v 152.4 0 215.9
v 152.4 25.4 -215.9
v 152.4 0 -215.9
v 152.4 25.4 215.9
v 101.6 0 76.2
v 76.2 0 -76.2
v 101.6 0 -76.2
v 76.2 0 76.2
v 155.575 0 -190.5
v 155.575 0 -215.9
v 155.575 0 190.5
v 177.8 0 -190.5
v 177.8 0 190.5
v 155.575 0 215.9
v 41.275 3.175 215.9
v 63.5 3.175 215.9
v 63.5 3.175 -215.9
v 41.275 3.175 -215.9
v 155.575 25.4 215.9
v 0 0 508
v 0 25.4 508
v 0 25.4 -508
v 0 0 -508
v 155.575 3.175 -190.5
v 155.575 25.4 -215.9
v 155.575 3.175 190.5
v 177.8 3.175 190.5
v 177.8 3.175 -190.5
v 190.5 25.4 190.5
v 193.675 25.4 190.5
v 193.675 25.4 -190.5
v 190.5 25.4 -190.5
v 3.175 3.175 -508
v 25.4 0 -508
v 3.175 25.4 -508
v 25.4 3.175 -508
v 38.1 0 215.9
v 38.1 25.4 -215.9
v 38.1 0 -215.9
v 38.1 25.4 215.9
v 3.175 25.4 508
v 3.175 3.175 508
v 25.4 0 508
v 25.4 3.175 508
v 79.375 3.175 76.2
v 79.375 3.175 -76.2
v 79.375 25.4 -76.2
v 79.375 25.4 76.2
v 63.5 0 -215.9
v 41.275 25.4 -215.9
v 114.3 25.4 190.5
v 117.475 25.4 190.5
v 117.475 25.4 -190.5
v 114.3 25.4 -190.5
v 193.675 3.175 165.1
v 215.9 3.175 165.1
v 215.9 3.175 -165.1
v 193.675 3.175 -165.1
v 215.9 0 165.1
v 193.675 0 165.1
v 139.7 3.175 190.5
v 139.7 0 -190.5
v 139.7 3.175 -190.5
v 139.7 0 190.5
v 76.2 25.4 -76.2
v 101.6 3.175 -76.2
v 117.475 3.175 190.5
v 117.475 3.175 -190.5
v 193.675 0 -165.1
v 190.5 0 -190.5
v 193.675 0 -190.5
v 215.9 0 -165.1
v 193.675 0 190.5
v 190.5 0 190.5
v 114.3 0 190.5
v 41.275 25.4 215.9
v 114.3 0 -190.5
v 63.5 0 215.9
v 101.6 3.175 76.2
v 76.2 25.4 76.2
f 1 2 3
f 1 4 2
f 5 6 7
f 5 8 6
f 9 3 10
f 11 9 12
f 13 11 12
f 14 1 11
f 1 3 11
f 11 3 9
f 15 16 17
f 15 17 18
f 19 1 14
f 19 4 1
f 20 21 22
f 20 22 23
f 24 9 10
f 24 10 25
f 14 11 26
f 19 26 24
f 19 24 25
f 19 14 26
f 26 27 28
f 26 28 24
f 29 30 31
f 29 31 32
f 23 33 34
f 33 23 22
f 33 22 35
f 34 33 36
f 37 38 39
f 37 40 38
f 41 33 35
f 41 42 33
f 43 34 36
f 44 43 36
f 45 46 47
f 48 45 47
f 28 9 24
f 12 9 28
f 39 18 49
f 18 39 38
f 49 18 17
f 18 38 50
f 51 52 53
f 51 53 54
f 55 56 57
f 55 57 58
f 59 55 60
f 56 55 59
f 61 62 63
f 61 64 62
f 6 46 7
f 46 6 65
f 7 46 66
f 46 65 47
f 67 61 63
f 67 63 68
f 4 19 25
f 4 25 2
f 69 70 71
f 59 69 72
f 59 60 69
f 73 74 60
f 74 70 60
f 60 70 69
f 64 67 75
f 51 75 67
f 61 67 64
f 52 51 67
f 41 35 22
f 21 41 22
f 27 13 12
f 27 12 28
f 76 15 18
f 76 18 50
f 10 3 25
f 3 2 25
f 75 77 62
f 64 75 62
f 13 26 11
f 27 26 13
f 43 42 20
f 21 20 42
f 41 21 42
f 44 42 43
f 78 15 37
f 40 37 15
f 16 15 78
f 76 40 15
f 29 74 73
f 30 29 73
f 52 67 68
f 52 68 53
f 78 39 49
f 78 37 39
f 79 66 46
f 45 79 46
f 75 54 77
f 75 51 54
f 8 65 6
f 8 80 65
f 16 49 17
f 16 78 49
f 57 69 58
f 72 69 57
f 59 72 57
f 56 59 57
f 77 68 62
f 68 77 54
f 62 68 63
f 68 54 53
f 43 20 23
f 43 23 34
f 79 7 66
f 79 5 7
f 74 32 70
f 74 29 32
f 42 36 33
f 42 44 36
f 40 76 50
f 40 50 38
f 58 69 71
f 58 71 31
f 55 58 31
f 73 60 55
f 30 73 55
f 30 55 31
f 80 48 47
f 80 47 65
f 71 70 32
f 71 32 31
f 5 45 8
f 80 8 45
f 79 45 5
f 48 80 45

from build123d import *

# Parameters (mm, degrees)
F1_DEPTH  = 508
F2_DEPTH  = 215.9
F3_DEPTH  = 76.2
F4_DEPTH  = 190.5
F5_DEPTH  = 215.9
F6_DEPTH  = 190.5
F7_W      = 22.225
F7_H      = 3.175
F8_DEPTH  = 25.4
F9_W      = 22.225
F9_H      = 3.175
F10_DEPTH = 25.4
F11_W     = 22.225
F11_H     = 3.175
F12_DEPTH = 25.4
F13_W     = 22.225
F13_H     = 3.175
F14_DEPTH = 25.4


with BuildPart() as f1:
    # F0 (on Top) → F1 (new body, symmetric)
    with BuildSketch(Plane.XY):
        Polygon((3.175, 25.4), (0, 25.4), (0, 0), (25.4, 0), (25.4, 3.175), (3.175, 3.175), align=None)
    extrude(amount=F1_DEPTH, both=True)


with BuildPart() as f2:
    # F0 (on Top) → F2 (new body, symmetric)
    with BuildSketch(Plane.XY):
        Polygon((63.5, 0), (63.5, 3.175), (41.275, 3.175), (41.275, 25.4), (38.1, 25.4), (38.1, 0), align=None)
    extrude(amount=F2_DEPTH, both=True)


with BuildPart() as f3:
    # F0 (on Top) → F3 (new body, symmetric)
    with BuildSketch(Plane.XY):
        Polygon((101.6, 0), (101.6, 3.175), (79.375, 3.175), (79.375, 25.4), (76.2, 25.4), (76.2, 0), align=None)
    extrude(amount=F3_DEPTH, both=True)


with BuildPart() as f4:
    # F0 (on Top) → F4 (new body, symmetric)
    with BuildSketch(Plane.XY):
        Polygon((139.7, 0), (139.7, 3.175), (117.475, 3.175), (117.475, 25.4), (114.3, 25.4), (114.3, 0), align=None)
    extrude(amount=F4_DEPTH, both=True)


with BuildPart() as f5:
    # F0 (on Top) → F5 (new body, symmetric)
    with BuildSketch(Plane.XY):
        Polygon((177.8, 0), (177.8, 3.175), (155.575, 3.175), (155.575, 25.4), (152.4, 25.4), (152.4, 0), align=None)
    extrude(amount=F5_DEPTH, both=True)

    # F7 (on face) → F8 (cut)
    with BuildSketch(Plane(origin=(0, 0, -215.9), x_dir=(1, 0, 0), z_dir=(0, 0, -1))):
        with Locations((166.6875, -1.5875)):
            Rectangle(F7_W, F7_H)
    extrude(amount=-F8_DEPTH, mode=Mode.SUBTRACT)

    # F9 (on face) → F10 (cut)
    with BuildSketch(Plane.XY.offset(215.9)):
        with Locations((166.6875, 1.5875)):
            Rectangle(F9_W, F9_H)
    extrude(amount=-F10_DEPTH, mode=Mode.SUBTRACT)


with BuildPart() as f6:
    # F0 (on Top) → F6 (new body, symmetric)
    with BuildSketch(Plane.XY):
        Polygon((215.9, 0), (215.9, 3.175), (193.675, 3.175), (193.675, 25.4), (190.5, 25.4), (190.5, 0), align=None)
    extrude(amount=F6_DEPTH, both=True)

    # F11 (on face) → F12 (cut)
    with BuildSketch(Plane(origin=(0, 0, -190.5), x_dir=(1, 0, 0), z_dir=(0, 0, -1))):
        with Locations((204.7875, -1.5875)):
            Rectangle(F11_W, F11_H)
    extrude(amount=-F12_DEPTH, mode=Mode.SUBTRACT)

    # F13 (on face) → F14 (cut)
    with BuildSketch(Plane.XY.offset(190.5)):
        with Locations((204.7875, 1.5875)):
            Rectangle(F13_W, F13_H)
    extrude(amount=-F14_DEPTH, mode=Mode.SUBTRACT)


solid = Compound([f1.part, f2.part, f3.part, f4.part, f5.part, f6.part])
